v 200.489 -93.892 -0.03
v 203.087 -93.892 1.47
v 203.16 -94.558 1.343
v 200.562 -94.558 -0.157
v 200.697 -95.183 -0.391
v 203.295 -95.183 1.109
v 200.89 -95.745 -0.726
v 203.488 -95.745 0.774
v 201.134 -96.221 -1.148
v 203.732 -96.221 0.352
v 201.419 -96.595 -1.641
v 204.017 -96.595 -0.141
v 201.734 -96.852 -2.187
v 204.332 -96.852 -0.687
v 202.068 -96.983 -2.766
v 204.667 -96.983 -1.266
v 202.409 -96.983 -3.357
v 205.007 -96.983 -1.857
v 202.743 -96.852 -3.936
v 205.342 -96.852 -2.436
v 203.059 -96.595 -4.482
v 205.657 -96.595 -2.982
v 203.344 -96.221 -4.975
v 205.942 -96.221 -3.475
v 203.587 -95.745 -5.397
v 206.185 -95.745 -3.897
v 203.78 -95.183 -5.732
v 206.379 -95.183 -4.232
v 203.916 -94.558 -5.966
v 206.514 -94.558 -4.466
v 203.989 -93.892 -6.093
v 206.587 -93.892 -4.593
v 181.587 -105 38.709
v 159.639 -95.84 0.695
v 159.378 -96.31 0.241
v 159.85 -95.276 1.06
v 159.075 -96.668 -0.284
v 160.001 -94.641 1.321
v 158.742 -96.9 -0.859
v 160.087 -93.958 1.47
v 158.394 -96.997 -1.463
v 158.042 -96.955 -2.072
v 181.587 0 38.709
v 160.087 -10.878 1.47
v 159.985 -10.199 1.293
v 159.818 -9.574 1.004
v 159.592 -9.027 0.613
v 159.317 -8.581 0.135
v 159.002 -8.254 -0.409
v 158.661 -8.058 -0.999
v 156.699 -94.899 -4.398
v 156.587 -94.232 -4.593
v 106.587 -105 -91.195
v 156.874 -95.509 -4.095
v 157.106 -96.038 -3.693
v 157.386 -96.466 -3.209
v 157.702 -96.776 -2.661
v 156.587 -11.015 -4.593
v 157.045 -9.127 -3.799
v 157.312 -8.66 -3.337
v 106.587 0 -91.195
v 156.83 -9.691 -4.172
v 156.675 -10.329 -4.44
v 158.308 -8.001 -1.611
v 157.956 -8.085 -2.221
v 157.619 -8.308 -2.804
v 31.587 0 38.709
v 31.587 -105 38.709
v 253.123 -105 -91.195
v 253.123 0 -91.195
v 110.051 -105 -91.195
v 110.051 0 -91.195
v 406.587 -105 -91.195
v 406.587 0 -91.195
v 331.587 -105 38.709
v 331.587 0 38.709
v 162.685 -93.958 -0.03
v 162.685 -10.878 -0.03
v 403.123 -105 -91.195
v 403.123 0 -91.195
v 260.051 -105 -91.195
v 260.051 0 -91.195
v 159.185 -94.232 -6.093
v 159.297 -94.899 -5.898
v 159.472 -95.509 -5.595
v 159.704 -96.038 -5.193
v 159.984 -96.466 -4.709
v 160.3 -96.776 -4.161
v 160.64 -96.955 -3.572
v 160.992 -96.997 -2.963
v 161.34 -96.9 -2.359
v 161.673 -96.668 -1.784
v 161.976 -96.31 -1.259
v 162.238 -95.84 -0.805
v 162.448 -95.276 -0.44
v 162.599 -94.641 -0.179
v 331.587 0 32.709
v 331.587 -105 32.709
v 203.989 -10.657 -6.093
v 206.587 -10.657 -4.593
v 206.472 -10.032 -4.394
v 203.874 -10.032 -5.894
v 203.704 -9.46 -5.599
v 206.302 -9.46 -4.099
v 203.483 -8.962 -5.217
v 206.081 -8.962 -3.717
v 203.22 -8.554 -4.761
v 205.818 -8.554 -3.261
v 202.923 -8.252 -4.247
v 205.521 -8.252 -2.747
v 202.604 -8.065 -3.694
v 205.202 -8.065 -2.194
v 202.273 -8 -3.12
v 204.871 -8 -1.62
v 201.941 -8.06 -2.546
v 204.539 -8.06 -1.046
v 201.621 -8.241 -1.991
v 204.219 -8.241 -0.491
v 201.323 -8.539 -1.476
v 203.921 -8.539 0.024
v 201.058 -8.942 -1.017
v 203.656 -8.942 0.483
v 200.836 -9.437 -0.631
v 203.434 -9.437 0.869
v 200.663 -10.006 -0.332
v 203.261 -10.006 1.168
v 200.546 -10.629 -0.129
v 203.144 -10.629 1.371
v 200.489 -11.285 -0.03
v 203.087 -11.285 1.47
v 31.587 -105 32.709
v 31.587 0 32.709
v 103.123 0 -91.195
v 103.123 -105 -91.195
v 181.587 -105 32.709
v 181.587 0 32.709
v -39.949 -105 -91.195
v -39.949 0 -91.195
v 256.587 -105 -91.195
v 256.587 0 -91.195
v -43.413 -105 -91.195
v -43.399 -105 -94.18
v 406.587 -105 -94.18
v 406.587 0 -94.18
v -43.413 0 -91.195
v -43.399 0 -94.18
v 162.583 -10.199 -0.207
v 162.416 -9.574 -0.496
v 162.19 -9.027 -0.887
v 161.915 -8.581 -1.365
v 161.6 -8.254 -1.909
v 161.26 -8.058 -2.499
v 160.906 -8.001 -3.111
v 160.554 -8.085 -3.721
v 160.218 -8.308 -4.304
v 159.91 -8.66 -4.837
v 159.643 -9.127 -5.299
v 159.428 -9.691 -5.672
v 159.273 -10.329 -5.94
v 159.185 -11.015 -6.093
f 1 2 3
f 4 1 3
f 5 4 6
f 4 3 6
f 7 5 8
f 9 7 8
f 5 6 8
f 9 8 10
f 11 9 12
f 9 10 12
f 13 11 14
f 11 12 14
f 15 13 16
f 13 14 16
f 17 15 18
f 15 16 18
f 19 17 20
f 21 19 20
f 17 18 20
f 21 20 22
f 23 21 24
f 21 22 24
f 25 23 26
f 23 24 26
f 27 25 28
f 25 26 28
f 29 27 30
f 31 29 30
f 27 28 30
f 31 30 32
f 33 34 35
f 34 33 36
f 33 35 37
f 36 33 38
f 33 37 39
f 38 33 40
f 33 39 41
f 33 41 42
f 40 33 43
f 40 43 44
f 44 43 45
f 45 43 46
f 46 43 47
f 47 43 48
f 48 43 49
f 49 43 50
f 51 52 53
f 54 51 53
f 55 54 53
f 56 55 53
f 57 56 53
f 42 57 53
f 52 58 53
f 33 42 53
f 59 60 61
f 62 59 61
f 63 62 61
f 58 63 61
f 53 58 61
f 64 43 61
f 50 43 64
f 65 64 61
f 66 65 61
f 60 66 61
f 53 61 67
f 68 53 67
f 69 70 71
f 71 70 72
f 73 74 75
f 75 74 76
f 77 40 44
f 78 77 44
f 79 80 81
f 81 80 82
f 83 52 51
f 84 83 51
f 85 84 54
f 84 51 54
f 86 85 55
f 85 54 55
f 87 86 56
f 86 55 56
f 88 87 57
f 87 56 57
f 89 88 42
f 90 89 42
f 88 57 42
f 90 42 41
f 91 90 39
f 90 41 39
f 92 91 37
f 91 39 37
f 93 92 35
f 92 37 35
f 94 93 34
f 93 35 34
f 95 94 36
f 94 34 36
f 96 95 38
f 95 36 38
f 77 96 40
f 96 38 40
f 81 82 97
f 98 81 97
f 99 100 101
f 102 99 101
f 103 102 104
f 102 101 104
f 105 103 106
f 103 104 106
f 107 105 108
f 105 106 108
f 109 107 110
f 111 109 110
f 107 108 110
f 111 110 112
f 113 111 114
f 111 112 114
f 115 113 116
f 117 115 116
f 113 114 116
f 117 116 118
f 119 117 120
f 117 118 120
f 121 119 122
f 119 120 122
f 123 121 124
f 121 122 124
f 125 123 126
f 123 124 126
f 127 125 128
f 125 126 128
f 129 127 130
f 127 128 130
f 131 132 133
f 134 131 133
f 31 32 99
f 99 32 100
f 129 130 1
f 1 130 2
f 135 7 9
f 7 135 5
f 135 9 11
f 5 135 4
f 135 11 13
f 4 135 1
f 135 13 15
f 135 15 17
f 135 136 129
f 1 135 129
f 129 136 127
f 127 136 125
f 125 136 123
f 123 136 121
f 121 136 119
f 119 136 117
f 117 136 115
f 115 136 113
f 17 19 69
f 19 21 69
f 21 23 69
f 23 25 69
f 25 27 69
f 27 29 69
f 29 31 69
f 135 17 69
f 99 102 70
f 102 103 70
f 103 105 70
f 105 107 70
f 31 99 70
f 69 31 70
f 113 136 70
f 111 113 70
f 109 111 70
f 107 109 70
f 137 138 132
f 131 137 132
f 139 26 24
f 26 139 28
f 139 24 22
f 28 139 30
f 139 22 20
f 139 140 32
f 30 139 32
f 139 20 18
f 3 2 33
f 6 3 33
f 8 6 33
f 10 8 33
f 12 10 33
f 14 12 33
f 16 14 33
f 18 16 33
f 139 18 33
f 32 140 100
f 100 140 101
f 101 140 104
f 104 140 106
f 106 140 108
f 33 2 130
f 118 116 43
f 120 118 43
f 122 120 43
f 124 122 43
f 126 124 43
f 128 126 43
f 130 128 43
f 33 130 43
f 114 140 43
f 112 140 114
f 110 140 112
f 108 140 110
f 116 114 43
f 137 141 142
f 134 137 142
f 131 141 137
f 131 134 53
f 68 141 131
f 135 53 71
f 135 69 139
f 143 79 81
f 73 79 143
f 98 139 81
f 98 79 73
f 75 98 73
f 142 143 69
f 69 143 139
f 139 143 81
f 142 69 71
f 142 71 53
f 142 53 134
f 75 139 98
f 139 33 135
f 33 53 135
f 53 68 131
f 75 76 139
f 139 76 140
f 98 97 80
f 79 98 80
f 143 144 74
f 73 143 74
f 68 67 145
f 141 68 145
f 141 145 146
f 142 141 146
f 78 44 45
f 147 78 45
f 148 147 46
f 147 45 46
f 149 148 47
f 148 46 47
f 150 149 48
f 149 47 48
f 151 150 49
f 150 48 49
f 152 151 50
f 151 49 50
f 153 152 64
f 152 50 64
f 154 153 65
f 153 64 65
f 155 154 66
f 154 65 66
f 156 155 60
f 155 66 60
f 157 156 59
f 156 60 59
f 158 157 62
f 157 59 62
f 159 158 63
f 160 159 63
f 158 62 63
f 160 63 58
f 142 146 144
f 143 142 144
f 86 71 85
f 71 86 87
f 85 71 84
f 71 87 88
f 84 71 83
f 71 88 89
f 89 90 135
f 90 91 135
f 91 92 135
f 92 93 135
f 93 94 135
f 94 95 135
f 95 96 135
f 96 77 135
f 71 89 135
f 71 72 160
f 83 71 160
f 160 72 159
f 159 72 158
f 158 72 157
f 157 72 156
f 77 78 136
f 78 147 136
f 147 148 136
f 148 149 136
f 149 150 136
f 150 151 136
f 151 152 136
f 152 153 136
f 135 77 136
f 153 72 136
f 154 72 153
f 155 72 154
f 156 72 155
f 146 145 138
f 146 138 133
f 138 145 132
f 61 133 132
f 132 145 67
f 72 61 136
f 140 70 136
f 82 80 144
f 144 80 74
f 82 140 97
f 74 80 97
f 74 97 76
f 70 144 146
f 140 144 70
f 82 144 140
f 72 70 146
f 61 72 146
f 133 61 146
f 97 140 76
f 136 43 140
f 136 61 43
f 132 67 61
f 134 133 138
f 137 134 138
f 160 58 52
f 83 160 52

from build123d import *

# Parameters (mm, degrees)
F1_DEPTH = 105
F4_DEPTH = 3
F5_DEPTH = 3.2


with BuildPart() as f1:
    # F0 (on Front) → F1 (new body)
    with BuildSketch(Plane.XZ):
        Polygon((31.5868725905, 38.7087155582), (-43.4131274095, -91.1950950095), (-39.9490257943, -91.1950950095), (31.5868725905, 32.7087155582), (103.1227709754, -91.1950950095), (106.5868725905, -91.1950950095), align=None)
        Polygon((181.5868725905, 38.7087155582), (106.5868725905, -91.1950950095), (110.0509742057, -91.1950950095), (181.5868725905, 32.7087155582), (253.1227709754, -91.1950950095), (256.5868725905, -91.1950950095), align=None)
        Polygon((403.1227709754, -91.1950950095), (406.5868725905, -91.1950950095), (331.5868725905, 38.7087155582), (256.5868725905, -91.1950950095), (260.0509742057, -91.1950950095), (331.5868725905, 32.7087155582), align=None)
        Polygon((-39.9490257943, -91.1950950095), (-43.4131274095, -91.1950950095), (-43.3987992861, -94.1795955126), (406.5868725905, -94.1795955126), (406.5868725905, -91.1950950095), (403.1227709754, -91.1950950095), (260.0509742057, -91.1950950095), (256.5868725905, -91.1950950095), (253.1227709754, -91.1950950095), (110.0509742057, -91.1950950095), (106.5868725905, -91.1950950095), (103.1227709754, -91.1950950095), align=None)
    extrude(amount=F1_DEPTH)

    # F2 (on face) → F4 (cut)
    with BuildSketch(Plane(origin=(152.9515199535, 0, 88.3066012181), x_dir=(0, 1, 0), z_dir=(0.8660254038, 0, 0.5))):
        with BuildLine():
            Line((-11.2848039716, -100.270705274), (-93.8924178481, -100.270705274))
            ThreePointArc((-93.8924178481, -100.270705274), (-97, -103.770705274), (-93.8924178481, -107.270705274))
            Line((-93.8924178481, -107.270705274), (-10.656950064, -107.270705274))
            ThreePointArc((-10.656950064, -107.270705274), (-8.0142508316, -103.5055153734), (-11.2848039716, -100.270705274))
        make_face()
    extrude(amount=-F4_DEPTH, mode=Mode.SUBTRACT)

    # F3 (on face) → F5 (cut)
    with BuildSketch(Plane(origin=(119.4287889323, 0, -68.952243439), x_dir=(0, -1, 0), z_dir=(-0.8660254038, 0, 0.5))):
        with BuildLine():
            Line((93.957901001, 81.3161673165), (10.8784036711, 81.3161673165))
            ThreePointArc((10.8784036711, 81.3161673165), (8.0006789358, 77.7585614935), (11.0152736306, 74.3161673165))
            Line((11.0152736306, 74.3161673165), (94.2316353321, 74.3161673165))
            ThreePointArc((94.2316353321, 74.3161673165), (96.9972779307, 77.9296696835), (93.957901001, 81.3161673165))
        make_face()
    extrude(amount=-F5_DEPTH, mode=Mode.SUBTRACT)


solid = f1.part
